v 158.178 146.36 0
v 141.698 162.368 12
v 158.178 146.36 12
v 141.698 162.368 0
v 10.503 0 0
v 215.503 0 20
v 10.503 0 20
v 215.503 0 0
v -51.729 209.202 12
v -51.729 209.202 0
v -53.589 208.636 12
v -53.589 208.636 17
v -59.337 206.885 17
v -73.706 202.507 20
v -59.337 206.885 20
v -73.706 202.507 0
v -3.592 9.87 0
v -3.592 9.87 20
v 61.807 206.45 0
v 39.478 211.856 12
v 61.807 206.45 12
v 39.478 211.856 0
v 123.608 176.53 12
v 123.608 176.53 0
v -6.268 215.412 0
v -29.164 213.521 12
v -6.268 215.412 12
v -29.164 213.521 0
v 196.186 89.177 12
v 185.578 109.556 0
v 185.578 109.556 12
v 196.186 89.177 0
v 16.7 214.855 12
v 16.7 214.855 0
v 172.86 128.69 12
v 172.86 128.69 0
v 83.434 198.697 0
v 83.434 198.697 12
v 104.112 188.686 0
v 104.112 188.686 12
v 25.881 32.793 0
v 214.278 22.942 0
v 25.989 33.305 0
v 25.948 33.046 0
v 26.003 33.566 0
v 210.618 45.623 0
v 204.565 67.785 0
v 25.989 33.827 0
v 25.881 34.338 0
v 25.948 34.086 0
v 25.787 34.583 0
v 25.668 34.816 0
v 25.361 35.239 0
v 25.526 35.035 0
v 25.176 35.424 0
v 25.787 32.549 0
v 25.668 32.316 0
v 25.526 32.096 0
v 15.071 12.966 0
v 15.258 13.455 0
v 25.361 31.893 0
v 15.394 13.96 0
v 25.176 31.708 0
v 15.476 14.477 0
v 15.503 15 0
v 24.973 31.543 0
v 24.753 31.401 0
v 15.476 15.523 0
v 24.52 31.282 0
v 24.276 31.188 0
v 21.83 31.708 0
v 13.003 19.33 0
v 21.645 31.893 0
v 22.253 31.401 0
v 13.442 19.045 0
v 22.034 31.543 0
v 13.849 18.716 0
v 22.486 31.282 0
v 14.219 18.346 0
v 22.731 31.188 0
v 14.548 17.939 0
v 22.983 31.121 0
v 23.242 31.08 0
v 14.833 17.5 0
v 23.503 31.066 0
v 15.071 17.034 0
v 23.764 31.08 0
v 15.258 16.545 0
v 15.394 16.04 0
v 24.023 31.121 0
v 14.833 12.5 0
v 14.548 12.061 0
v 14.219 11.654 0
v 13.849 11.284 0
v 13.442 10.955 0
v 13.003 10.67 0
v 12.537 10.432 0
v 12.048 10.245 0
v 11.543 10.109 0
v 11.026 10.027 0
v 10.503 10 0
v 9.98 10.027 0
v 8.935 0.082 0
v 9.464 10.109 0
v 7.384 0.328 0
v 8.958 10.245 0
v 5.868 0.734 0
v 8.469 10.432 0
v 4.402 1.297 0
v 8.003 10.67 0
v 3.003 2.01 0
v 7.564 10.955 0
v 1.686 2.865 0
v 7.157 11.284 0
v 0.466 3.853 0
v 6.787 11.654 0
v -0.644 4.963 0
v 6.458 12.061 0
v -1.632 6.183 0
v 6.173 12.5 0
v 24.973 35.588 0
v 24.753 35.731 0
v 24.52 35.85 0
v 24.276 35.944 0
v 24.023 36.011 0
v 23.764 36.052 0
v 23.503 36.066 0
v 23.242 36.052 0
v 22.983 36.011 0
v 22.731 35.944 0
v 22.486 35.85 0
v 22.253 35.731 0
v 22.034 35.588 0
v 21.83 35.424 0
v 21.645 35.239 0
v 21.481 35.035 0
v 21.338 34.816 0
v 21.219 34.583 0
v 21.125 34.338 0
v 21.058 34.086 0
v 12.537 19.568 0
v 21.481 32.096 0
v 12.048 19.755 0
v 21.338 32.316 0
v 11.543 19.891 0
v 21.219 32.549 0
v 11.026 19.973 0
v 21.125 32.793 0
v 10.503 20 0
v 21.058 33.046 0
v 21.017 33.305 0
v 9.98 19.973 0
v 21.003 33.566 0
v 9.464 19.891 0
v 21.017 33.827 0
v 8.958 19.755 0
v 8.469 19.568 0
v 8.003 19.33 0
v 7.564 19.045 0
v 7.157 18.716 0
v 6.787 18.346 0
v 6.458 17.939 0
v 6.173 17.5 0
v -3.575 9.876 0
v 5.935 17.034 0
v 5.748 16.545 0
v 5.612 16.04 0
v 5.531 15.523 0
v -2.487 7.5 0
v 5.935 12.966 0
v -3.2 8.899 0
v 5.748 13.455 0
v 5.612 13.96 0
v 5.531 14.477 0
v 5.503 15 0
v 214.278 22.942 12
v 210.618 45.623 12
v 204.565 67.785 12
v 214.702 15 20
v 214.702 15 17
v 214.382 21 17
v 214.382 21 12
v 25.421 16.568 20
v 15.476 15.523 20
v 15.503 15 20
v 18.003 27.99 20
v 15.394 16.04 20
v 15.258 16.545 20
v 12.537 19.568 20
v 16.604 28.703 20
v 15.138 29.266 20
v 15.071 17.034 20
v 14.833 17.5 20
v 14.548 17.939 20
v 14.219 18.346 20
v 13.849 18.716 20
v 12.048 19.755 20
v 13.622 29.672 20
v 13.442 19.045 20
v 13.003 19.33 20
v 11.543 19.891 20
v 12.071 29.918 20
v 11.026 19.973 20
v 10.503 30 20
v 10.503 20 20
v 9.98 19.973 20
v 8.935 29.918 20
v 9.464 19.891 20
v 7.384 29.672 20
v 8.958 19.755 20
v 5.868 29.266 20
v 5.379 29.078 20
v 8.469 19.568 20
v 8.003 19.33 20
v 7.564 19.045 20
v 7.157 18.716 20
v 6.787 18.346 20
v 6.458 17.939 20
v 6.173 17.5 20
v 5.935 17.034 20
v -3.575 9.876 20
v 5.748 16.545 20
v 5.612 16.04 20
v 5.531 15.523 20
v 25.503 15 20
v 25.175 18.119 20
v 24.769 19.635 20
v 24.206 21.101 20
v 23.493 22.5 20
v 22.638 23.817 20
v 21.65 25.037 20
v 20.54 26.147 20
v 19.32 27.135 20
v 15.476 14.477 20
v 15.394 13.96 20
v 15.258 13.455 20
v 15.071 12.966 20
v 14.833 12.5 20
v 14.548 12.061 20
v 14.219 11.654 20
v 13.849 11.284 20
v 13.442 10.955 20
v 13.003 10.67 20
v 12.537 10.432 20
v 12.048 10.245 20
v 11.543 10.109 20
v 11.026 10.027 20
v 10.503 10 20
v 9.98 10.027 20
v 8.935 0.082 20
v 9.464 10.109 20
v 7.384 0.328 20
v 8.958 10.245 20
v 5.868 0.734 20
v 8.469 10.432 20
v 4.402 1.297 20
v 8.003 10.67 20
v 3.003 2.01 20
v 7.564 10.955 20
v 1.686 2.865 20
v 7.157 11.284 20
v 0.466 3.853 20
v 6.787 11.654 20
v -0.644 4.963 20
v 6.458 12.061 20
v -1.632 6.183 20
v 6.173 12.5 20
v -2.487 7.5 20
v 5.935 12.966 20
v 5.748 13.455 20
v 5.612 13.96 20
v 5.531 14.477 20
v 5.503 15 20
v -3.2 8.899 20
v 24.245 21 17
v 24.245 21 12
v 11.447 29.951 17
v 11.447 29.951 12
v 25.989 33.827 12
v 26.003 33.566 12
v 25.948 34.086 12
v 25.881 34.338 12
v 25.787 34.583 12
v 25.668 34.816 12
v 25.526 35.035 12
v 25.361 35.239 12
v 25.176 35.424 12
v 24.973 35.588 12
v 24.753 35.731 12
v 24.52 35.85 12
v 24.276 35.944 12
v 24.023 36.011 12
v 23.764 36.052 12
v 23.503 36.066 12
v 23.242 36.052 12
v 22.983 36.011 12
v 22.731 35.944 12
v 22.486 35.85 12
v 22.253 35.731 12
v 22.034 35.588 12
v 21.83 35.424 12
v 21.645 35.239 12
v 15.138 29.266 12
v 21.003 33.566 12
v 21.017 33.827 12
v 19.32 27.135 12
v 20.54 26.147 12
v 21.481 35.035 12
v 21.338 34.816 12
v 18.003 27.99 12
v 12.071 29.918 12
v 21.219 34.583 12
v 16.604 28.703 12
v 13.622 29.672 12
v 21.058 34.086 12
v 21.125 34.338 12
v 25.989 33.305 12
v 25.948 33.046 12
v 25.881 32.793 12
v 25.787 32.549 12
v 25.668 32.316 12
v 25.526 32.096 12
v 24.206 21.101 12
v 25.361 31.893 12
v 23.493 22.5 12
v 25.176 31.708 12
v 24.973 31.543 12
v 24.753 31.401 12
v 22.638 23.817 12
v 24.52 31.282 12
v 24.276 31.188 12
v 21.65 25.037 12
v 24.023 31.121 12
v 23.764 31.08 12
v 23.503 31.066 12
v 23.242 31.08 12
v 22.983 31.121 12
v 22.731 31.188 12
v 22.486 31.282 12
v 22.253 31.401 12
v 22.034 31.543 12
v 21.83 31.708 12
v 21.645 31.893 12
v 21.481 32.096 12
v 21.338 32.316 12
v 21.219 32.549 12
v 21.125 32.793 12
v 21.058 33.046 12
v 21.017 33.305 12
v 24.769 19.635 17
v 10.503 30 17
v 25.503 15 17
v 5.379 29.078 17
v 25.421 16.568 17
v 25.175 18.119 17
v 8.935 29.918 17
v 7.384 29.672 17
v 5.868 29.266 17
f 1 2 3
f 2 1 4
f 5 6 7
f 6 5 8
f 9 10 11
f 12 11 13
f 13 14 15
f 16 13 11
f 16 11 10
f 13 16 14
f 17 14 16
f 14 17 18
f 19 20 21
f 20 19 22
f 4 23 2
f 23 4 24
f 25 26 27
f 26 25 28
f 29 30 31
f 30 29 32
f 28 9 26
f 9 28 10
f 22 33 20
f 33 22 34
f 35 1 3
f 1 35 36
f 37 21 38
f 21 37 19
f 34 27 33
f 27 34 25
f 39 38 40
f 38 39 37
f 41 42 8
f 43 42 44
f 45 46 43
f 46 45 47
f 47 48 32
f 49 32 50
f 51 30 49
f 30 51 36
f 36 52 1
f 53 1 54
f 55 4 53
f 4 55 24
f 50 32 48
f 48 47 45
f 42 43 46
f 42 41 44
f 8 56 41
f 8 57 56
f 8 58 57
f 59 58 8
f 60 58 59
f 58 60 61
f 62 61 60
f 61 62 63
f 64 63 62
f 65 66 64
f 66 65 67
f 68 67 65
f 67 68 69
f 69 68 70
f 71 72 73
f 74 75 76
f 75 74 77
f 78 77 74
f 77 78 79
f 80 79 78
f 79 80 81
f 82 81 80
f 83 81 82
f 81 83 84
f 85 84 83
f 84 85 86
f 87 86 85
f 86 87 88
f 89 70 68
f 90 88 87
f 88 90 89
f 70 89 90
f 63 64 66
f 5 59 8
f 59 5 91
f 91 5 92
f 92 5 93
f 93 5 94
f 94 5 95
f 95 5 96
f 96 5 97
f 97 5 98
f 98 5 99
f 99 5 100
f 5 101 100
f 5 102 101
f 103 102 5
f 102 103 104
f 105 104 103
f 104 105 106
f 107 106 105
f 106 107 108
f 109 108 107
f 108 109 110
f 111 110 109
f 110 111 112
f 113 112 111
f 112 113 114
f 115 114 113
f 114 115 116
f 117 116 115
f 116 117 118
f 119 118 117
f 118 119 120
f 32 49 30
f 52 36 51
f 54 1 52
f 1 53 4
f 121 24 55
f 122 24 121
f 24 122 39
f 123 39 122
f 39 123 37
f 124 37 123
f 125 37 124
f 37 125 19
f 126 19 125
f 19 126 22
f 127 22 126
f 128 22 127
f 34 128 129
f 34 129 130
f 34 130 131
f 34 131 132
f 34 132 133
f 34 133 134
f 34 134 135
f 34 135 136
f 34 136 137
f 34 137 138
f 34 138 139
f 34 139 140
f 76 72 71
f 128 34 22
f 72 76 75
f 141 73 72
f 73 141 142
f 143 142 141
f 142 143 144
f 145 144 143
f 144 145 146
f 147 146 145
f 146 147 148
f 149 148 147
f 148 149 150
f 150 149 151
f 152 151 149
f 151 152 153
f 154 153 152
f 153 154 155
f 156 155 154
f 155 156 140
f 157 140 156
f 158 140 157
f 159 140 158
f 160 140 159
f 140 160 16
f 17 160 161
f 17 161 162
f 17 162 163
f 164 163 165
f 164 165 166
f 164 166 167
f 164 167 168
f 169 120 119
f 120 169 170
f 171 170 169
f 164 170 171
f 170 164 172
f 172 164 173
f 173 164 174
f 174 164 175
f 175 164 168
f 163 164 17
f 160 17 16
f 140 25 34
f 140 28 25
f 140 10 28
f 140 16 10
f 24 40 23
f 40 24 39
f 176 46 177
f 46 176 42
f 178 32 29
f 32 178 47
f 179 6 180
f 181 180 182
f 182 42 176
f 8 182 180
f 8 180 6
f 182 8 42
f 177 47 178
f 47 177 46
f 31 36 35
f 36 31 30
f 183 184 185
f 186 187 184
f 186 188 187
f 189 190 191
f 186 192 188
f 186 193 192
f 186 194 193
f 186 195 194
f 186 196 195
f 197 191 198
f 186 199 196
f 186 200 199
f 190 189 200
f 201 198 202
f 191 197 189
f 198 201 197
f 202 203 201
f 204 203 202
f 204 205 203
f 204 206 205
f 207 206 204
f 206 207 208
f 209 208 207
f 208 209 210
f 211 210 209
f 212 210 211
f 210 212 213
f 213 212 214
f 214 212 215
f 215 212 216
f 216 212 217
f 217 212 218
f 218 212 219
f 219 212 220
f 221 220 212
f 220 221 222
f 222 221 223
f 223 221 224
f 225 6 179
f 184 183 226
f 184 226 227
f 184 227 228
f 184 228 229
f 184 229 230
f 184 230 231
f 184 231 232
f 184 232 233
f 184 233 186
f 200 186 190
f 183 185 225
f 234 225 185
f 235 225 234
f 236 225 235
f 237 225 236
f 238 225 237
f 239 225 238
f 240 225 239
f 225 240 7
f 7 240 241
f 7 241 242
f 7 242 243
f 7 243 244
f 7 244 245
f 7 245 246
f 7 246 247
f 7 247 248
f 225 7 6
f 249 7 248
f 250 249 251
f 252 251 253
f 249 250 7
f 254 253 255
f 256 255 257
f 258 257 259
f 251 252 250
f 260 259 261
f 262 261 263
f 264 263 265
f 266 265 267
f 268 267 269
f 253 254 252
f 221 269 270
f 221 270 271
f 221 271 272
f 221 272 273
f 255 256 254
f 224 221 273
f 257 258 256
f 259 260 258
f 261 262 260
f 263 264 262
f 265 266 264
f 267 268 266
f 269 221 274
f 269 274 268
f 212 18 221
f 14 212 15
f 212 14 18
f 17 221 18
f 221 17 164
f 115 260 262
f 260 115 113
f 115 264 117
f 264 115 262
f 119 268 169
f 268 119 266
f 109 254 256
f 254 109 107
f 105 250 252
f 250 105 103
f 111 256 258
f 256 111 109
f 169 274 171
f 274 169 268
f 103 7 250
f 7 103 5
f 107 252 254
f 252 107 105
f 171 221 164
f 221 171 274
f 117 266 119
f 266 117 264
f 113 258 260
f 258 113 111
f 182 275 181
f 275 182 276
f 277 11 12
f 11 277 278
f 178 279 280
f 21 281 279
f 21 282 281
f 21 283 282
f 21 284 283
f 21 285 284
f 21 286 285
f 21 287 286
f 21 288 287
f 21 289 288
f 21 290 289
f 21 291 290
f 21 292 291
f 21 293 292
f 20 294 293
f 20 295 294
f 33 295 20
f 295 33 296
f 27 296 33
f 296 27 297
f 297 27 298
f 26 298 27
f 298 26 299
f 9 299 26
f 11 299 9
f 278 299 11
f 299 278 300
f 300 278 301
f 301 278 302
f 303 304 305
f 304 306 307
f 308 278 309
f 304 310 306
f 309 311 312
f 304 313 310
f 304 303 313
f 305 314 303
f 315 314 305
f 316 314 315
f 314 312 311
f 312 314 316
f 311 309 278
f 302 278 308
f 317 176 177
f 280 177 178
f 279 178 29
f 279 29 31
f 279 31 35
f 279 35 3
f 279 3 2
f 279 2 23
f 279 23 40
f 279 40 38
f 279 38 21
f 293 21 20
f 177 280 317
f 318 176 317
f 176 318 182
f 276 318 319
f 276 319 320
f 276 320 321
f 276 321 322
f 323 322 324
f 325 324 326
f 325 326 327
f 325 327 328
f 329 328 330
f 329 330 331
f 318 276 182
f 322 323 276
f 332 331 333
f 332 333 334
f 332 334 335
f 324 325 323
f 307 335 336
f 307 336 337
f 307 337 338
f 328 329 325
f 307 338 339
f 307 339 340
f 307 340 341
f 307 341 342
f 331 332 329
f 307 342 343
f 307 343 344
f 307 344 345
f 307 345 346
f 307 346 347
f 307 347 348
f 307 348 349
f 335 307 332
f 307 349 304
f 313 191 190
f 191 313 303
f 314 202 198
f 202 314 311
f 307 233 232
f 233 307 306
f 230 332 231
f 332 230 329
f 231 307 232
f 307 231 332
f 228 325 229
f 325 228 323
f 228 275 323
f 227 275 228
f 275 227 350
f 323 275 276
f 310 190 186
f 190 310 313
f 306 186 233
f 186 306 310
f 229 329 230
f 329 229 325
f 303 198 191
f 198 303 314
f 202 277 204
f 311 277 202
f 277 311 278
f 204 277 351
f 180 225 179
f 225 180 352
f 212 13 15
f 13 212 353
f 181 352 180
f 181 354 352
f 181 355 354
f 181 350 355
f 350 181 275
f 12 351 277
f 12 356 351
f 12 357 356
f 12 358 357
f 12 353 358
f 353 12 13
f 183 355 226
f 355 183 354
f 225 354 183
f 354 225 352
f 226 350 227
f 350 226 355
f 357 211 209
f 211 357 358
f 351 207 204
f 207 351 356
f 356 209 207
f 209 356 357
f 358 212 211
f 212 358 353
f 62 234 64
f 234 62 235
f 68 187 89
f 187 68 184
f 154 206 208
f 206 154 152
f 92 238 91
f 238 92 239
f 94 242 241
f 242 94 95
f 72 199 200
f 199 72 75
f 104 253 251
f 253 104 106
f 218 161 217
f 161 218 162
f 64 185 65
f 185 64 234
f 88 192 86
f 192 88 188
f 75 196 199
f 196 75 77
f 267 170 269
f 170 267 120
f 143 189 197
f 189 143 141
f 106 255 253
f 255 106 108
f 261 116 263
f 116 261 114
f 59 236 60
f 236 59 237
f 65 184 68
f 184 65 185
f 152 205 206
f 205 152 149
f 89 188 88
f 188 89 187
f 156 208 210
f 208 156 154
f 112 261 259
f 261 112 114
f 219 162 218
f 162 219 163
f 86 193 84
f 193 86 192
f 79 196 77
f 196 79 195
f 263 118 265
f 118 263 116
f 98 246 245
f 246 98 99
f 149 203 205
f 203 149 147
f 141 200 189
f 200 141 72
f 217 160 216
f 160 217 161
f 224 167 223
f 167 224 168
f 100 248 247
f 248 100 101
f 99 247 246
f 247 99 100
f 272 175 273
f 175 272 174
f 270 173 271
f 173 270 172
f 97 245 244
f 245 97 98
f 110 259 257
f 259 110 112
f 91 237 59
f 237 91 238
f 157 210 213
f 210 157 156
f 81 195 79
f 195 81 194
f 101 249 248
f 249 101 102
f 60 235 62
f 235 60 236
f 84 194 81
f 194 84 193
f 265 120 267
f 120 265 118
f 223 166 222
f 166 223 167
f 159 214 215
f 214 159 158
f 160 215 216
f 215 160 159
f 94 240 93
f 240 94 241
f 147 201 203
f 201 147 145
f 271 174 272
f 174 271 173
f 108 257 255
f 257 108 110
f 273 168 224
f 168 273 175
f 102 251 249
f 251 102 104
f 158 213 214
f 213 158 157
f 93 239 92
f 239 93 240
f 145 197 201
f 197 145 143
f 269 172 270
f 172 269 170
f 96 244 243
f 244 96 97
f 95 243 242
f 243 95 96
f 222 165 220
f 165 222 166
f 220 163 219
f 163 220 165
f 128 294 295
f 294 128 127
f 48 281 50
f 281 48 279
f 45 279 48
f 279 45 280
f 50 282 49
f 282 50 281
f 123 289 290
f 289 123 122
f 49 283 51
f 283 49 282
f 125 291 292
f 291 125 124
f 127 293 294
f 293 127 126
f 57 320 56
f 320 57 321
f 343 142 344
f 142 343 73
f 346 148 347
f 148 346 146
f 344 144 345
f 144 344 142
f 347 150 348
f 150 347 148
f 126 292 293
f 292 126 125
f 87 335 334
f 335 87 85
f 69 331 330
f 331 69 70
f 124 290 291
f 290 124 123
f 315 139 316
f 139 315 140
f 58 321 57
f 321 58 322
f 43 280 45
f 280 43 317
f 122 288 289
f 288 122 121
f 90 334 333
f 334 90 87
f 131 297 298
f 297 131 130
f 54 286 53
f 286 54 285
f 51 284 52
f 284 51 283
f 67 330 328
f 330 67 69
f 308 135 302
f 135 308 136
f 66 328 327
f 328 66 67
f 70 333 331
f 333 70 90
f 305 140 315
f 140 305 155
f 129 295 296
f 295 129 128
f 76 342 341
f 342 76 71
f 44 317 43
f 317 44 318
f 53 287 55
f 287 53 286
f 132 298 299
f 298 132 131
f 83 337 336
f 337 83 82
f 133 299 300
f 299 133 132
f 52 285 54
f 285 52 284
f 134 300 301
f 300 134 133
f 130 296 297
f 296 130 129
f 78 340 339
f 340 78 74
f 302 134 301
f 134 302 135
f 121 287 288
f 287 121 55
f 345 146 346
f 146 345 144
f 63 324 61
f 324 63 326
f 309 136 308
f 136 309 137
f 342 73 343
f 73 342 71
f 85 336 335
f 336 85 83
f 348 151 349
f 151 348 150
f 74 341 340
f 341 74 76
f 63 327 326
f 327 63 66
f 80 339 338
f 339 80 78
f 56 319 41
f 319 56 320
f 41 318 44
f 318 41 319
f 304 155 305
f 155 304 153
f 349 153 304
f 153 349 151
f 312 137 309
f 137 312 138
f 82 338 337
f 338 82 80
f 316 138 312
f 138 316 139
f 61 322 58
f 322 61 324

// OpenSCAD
// Settings
$fn=60;
Radius = 200; // Distance from the center of the hole to the edge
HoleDiameter = 10;
HoleEnforcementThickness=HoleDiameter;
Thickness=20;
BaseAngle=110; // Works for 0 to ~250 degrees
MembraneThickness=3;
MembraneGap=5;
SensorCableHoleDiameter=5;

// TODO:
// - Create the mount

// Calculated values
holeCenterY = HoleEnforcementThickness + HoleDiameter/2;
holeCenterX = holeCenterY / tan(BaseAngle/2);
basicSliceRadius = Radius+holeCenterX+HoleDiameter/2;

// NOTE: Needs openscad 2016.xx+ (for the angle parameter to work)
// r -> radius of the pie
// h -> Thickness of the pie
// a -> angle of the slice
module pie_slice(r,h,a) {
  translate([0,0,h/2]) {
    rotate_extrude(convexity = 10, angle=a)
    translate([0,-h/2,0]) square(size=[r,h]);
  }
}

module mountRing() {
  translate([holeCenterX, holeCenterY, Thickness/2])
  cylinder(d=HoleDiameter+2*HoleEnforcementThickness, h=Thickness, center=true);
}

// The sensor base.
module base() {
  union() {
    difference() {
      pie_slice(r=basicSliceRadius, h=Thickness, a=BaseAngle);

      // Remove the non-needed tip of the pie slice
      translate([holeCenterX, holeCenterY,0])
      rotate([0,0,BaseAngle+90])
      pie_slice(r=Radius, h=Thickness, a=180-BaseAngle);
    }
    mountRing();
  }
}

difference() {
  base();
  // Base hole
  translate([holeCenterX, holeCenterY, Thickness/2])
  cylinder(d=HoleDiameter, h=Thickness, center=true);

  // Sensor pocket (deep one, without the margin)
  membraneMarginY = HoleEnforcementThickness + HoleDiameter/2 + MembraneThickness * 2;
  membraneMarginX = membraneMarginY / tan(BaseAngle/2);
  difference() {
    translate([membraneMarginX, membraneMarginY, Thickness - MembraneThickness - MembraneGap])
    pie_slice(r=basicSliceRadius, h=Thickness, a=BaseAngle);
    mountRing();
  }

  // Sensor pocket (shallow one, with the margin)
  difference() {
    translate([holeCenterX, holeCenterY, Thickness - MembraneThickness])
    pie_slice(r=basicSliceRadius-holeCenterX, h=Thickness/2, a=BaseAngle);
    mountRing();
  }

  // Sensor cable hole
  sensorCableHoleCenterX = holeCenterX + HoleEnforcementThickness + 3;
  sensorCableHoleCenterY = sensorCableHoleCenterX * tan(BaseAngle/2);
  translate([sensorCableHoleCenterX, sensorCableHoleCenterY, Thickness/2])
  cylinder(d=SensorCableHoleDiameter, h=Thickness, center=true);
}
